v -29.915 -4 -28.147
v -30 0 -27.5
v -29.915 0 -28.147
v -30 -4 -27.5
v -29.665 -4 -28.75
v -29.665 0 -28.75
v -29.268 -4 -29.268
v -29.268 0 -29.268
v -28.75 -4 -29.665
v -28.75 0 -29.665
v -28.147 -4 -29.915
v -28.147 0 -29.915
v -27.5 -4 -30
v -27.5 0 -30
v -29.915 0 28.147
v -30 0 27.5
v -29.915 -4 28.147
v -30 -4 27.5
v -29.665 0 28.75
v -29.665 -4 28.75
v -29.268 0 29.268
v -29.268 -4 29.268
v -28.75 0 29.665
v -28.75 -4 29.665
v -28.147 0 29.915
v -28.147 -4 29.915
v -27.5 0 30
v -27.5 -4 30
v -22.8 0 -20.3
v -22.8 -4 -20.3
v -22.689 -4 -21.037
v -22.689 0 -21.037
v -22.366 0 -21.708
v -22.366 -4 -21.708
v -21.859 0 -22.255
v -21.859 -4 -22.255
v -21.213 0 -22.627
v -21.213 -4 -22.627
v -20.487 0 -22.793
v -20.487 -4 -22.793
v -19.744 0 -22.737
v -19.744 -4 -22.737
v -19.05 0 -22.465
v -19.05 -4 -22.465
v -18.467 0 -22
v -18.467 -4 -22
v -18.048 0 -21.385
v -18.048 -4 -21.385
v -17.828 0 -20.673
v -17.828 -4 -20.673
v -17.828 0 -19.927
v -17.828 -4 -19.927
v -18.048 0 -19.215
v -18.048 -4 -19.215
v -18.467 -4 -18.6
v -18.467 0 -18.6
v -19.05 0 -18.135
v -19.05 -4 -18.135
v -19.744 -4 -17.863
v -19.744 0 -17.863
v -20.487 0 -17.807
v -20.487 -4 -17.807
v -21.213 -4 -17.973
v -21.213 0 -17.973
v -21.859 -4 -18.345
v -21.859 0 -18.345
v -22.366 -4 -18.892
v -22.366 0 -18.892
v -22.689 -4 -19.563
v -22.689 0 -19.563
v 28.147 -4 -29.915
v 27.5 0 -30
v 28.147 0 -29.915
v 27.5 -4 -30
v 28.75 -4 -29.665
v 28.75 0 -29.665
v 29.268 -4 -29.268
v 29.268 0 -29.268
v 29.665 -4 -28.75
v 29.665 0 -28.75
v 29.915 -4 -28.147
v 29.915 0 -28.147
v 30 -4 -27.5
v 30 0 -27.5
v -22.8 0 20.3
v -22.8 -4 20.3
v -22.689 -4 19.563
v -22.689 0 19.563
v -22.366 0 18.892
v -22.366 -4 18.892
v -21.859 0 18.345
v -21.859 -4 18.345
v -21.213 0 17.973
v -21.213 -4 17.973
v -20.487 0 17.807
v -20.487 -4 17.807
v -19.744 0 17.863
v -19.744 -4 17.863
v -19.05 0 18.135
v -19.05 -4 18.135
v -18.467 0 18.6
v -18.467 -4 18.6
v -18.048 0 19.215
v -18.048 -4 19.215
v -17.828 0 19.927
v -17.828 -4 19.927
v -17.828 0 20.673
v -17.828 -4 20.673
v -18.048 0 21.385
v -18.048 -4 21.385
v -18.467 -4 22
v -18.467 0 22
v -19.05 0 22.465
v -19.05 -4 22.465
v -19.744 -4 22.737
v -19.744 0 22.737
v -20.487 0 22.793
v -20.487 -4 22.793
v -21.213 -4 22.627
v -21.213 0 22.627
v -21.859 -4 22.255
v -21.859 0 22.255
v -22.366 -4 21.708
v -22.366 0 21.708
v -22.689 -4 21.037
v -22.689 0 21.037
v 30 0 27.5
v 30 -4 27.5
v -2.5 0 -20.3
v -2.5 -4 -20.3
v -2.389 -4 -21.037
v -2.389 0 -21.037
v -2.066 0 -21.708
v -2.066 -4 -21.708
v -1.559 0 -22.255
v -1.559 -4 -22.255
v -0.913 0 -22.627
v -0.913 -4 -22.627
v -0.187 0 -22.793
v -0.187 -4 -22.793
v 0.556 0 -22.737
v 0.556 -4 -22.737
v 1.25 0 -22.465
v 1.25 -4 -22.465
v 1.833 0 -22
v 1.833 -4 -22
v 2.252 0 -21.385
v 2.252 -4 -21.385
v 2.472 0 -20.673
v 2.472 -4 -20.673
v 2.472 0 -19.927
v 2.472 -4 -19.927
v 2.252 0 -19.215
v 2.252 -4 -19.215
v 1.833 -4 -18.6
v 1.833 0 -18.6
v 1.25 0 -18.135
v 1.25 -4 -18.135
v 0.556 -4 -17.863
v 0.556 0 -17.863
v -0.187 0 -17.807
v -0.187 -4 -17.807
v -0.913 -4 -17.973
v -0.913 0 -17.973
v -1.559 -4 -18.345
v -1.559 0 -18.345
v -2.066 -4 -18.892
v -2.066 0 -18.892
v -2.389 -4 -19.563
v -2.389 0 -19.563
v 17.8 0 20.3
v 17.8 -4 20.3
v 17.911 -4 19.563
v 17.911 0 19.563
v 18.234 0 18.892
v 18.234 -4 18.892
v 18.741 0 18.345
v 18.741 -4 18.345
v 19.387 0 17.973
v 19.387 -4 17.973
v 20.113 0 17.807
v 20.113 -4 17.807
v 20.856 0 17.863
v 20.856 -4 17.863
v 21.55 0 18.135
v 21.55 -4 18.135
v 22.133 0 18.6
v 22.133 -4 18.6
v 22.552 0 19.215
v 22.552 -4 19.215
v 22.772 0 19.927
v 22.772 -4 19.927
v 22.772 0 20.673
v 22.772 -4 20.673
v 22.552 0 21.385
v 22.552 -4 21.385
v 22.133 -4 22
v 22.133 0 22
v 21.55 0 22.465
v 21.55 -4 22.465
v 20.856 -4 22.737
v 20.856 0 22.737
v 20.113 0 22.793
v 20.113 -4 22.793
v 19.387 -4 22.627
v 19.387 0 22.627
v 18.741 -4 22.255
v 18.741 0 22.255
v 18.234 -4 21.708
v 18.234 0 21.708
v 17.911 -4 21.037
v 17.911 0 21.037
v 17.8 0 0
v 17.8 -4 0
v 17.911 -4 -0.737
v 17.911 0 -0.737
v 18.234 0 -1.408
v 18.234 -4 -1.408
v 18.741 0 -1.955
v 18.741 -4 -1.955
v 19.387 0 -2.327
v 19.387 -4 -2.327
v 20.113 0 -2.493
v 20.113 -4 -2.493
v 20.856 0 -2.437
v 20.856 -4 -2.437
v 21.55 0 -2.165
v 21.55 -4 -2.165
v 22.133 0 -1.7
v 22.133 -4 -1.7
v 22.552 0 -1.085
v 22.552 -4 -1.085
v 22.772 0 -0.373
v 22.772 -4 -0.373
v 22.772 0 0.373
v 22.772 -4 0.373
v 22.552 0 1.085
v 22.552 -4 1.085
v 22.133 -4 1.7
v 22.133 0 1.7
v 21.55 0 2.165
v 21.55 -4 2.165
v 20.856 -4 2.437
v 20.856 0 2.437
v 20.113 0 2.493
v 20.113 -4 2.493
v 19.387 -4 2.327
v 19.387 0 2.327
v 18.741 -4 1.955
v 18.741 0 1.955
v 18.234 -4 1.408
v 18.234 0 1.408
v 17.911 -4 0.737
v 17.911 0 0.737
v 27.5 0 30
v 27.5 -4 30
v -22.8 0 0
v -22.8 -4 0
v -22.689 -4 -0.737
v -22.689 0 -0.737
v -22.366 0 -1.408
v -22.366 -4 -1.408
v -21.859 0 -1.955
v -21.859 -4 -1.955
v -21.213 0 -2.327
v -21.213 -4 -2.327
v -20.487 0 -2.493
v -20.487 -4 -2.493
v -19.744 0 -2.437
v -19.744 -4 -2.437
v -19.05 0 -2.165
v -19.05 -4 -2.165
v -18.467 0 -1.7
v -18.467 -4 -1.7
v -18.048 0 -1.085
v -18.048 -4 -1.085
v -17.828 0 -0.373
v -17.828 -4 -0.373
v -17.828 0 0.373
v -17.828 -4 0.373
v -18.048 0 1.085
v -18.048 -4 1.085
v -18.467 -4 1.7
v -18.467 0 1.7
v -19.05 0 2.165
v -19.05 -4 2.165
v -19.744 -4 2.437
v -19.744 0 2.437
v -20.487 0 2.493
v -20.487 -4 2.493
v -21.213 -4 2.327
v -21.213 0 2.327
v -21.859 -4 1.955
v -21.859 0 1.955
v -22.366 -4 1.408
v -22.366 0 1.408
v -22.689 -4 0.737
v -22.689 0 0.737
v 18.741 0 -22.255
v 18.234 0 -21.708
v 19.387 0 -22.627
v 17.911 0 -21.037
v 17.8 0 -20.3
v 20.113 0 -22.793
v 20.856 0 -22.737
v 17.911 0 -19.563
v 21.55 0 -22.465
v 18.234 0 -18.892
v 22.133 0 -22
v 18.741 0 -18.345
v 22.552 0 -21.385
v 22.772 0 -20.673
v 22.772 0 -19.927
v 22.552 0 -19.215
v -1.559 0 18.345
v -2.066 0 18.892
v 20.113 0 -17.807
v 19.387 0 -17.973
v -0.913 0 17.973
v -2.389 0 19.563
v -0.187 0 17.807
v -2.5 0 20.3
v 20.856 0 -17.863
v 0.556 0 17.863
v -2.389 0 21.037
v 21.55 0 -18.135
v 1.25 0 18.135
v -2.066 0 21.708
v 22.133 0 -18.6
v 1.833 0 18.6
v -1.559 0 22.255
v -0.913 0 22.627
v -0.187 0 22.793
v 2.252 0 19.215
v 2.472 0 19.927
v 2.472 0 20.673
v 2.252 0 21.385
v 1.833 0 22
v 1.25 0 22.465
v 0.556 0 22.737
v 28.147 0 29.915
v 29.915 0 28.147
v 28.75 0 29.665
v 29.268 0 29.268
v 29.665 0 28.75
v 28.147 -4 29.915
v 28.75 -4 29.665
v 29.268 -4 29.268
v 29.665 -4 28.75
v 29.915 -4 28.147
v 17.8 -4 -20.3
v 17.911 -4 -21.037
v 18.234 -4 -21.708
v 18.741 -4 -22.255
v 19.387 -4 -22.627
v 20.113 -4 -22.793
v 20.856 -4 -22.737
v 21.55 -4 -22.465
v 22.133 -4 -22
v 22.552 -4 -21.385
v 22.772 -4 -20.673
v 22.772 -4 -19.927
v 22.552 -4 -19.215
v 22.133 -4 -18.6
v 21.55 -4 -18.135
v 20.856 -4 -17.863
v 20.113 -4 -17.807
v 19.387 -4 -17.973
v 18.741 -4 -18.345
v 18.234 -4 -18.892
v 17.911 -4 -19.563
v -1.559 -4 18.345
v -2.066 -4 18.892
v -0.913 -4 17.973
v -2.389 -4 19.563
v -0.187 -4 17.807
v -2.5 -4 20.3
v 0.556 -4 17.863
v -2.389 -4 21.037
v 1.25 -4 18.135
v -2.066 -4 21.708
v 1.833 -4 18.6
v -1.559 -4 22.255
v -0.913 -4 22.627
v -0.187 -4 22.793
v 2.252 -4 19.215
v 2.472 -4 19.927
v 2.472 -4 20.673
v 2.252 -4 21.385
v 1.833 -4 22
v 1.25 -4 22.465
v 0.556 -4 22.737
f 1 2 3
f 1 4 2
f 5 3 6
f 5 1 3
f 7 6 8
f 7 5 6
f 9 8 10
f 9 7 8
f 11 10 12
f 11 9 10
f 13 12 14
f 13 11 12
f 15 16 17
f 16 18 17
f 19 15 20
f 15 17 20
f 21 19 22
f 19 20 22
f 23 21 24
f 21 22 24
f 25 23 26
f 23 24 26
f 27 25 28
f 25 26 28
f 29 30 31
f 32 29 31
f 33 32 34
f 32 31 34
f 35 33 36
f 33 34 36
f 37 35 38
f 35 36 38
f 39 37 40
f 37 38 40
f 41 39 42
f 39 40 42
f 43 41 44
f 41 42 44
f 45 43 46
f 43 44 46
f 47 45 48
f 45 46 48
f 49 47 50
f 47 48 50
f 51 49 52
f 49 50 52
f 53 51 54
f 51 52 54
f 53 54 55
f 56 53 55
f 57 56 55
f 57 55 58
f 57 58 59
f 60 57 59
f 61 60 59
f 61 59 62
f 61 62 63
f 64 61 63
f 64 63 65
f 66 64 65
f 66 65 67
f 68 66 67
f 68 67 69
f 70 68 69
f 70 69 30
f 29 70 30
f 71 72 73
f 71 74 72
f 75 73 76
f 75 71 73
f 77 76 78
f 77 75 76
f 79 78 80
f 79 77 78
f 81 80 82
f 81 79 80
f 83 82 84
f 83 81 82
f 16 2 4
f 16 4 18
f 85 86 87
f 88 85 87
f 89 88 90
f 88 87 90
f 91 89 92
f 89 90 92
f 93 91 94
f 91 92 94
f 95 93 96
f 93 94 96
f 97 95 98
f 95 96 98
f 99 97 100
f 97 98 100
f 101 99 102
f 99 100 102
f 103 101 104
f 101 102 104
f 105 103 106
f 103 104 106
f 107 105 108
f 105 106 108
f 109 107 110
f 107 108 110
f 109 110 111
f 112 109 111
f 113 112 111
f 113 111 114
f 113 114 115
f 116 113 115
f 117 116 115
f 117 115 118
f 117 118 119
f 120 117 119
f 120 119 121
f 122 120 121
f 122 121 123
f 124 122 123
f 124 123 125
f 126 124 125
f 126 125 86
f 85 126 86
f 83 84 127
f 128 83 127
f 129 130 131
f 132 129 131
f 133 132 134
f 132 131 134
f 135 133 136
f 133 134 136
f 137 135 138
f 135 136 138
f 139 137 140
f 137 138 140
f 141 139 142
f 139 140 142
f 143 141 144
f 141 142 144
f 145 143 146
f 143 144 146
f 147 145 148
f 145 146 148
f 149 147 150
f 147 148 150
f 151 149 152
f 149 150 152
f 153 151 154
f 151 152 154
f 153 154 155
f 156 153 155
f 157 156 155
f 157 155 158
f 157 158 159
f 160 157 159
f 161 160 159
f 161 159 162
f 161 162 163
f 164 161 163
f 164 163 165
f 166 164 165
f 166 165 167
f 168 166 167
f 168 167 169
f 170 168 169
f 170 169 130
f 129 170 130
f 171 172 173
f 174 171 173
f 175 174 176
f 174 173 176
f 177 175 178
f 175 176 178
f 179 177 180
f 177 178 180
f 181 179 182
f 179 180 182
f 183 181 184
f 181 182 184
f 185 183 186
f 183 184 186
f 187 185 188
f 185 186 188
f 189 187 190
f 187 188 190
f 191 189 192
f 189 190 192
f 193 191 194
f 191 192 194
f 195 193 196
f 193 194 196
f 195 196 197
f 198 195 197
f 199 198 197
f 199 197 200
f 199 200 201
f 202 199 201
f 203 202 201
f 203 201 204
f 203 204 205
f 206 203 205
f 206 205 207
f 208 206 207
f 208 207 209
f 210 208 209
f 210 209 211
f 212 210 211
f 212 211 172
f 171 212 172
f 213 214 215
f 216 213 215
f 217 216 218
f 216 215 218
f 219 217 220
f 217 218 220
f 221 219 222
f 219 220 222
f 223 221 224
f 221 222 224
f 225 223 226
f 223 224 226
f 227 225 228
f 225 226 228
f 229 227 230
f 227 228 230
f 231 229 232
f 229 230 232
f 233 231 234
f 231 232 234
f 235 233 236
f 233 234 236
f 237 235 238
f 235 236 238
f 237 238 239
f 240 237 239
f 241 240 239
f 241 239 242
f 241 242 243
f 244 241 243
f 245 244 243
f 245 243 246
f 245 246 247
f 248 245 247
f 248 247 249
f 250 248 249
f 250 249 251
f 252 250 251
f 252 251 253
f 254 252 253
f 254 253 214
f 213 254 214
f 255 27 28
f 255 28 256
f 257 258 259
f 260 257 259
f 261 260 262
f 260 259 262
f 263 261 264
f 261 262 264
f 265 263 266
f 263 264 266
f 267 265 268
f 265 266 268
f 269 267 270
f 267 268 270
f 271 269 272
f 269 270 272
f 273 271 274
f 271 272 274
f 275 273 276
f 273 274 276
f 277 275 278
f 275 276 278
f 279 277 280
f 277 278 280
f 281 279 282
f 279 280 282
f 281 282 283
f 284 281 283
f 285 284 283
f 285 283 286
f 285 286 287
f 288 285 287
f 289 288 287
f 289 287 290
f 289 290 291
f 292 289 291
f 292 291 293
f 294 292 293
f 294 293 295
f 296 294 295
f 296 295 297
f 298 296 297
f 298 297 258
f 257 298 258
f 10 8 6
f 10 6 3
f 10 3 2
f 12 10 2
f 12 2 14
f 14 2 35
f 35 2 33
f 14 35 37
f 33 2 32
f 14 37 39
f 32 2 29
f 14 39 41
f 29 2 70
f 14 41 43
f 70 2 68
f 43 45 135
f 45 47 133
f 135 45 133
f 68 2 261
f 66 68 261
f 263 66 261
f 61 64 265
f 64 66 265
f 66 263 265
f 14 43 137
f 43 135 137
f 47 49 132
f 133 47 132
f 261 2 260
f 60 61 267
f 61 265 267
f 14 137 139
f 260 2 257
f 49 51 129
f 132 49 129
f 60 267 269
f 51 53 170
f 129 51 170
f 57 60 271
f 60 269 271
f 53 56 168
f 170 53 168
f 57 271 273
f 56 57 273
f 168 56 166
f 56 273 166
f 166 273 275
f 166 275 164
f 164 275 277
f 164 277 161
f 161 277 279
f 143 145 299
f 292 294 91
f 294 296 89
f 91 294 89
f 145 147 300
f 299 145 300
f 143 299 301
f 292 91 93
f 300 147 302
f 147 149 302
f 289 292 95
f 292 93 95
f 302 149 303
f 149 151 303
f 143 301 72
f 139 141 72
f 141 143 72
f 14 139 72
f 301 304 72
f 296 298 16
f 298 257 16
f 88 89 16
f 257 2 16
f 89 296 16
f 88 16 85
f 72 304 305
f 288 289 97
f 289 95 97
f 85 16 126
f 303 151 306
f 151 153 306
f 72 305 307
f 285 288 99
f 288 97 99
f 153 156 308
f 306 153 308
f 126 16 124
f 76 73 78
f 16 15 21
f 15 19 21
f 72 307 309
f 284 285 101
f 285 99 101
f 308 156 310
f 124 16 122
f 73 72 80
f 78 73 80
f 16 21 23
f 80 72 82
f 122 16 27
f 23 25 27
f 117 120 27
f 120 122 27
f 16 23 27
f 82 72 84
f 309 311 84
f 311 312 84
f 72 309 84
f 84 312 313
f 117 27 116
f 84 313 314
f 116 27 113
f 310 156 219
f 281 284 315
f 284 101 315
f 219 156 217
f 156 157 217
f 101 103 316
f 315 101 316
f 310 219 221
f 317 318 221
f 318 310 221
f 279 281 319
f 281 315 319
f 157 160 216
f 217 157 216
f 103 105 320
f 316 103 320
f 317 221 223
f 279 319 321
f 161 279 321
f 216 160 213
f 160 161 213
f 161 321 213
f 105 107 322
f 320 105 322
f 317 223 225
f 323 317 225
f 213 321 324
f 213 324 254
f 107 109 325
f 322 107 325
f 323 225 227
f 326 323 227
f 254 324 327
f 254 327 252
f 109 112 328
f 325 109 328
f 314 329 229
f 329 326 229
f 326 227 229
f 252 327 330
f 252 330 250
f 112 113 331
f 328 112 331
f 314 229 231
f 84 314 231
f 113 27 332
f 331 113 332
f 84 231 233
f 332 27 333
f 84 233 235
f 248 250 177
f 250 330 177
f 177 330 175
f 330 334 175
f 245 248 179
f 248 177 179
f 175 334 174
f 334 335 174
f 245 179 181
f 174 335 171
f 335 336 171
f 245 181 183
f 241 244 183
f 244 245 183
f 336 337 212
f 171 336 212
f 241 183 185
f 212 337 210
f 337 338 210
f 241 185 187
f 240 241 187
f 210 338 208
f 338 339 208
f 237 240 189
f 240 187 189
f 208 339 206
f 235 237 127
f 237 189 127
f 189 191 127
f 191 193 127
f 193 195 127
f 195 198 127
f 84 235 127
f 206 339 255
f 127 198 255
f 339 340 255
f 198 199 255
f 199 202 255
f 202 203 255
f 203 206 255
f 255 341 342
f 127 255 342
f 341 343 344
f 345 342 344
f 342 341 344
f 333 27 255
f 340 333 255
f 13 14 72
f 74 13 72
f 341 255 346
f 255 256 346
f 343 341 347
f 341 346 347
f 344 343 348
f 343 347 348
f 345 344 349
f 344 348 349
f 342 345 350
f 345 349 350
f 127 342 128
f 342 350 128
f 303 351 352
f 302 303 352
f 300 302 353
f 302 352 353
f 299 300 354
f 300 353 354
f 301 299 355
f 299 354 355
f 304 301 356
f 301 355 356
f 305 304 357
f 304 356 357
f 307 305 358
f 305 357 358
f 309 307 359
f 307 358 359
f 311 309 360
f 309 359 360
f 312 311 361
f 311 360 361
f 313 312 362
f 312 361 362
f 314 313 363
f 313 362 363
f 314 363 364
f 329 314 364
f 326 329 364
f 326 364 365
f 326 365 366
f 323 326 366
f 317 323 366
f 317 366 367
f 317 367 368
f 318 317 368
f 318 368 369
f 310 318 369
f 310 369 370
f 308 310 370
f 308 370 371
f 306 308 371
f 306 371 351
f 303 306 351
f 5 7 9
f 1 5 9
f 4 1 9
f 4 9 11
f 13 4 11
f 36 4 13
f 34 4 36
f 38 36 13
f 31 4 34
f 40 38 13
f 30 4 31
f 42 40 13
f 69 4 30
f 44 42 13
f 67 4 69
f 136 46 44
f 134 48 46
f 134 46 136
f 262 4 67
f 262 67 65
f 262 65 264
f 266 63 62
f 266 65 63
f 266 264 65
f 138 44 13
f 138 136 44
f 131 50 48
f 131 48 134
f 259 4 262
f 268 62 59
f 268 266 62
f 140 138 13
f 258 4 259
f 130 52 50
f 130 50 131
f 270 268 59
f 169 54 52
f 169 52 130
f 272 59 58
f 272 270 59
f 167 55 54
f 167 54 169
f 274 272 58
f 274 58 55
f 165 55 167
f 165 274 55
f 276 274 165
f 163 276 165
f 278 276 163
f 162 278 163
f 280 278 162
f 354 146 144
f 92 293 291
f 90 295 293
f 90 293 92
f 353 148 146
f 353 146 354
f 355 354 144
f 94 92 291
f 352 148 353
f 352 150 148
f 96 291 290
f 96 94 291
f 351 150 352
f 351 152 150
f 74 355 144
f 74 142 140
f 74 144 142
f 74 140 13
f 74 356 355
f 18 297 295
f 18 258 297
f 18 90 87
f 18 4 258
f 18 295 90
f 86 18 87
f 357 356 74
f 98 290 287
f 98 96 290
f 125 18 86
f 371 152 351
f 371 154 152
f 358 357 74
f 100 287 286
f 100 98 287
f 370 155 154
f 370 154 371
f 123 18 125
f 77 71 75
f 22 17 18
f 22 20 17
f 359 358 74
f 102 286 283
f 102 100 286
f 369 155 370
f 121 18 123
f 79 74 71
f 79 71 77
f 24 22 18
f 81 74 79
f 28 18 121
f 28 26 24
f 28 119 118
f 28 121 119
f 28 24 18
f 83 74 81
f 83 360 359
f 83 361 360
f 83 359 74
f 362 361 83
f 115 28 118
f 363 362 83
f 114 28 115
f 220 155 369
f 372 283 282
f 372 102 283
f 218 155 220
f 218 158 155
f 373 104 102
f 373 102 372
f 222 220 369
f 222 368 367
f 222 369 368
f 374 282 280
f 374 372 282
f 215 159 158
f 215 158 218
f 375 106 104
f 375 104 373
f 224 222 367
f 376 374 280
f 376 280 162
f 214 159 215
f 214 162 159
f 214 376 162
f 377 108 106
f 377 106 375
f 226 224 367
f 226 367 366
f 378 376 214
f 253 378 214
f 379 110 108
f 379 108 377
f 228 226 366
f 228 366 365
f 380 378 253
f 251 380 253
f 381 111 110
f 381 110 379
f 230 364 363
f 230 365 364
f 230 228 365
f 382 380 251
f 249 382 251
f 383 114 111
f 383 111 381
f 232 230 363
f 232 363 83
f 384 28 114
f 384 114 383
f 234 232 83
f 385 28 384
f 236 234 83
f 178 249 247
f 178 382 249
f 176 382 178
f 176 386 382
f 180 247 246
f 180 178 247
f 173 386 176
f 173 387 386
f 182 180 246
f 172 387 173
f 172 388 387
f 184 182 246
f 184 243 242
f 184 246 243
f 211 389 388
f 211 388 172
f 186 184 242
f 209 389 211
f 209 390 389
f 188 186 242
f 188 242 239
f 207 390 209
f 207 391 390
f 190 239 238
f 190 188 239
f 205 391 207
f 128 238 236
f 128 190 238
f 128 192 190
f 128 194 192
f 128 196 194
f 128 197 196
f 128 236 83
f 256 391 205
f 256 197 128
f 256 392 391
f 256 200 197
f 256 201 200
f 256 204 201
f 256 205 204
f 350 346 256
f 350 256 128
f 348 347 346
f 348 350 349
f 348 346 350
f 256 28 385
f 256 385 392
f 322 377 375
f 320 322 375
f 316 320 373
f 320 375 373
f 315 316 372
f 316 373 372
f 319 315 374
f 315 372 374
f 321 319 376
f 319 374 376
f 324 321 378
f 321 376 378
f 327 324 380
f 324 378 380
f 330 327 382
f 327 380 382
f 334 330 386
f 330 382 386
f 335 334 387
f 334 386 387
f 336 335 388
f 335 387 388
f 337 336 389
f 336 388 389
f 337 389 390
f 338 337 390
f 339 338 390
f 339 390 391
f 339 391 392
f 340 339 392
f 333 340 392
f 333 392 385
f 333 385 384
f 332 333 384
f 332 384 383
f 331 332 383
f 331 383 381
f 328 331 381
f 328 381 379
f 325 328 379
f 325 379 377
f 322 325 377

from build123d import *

# Parameters (mm, degrees)
F0_W     = 60
F0_H     = 60
F1_DEPTH = 4
F2_D     = 5
F3_R     = 2.5


with BuildPart() as f1:
    # F0 (on Front) → F1 (new body)
    with BuildSketch(Plane.XZ):
        Rectangle(F0_W, F0_H)
    extrude(amount=F1_DEPTH)

    # F2 (through all)
    with Locations(Plane(origin=(0, 0, 0), x_dir=(1, 0, 0), z_dir=(0, 1, 0))):
        with Locations((-20.3, -20.3), (20.3, -20.3), (20.3, 20.3), (-20.3, 20.3), (0, 20.3), (20.3, 0), (0, -20.3), (-20.3, 0)):
            Hole(F2_D / 2)

    # F3
    f3_edges = [f1.edges().sort_by_distance(p)[0] for p in [
        (30, -2, 30),
        (30, -2, -30),
        (-30, -2, -30),
        (-30, -2, 30),
    ]]
    fillet(f3_edges, radius=F3_R)


solid = f1.part
